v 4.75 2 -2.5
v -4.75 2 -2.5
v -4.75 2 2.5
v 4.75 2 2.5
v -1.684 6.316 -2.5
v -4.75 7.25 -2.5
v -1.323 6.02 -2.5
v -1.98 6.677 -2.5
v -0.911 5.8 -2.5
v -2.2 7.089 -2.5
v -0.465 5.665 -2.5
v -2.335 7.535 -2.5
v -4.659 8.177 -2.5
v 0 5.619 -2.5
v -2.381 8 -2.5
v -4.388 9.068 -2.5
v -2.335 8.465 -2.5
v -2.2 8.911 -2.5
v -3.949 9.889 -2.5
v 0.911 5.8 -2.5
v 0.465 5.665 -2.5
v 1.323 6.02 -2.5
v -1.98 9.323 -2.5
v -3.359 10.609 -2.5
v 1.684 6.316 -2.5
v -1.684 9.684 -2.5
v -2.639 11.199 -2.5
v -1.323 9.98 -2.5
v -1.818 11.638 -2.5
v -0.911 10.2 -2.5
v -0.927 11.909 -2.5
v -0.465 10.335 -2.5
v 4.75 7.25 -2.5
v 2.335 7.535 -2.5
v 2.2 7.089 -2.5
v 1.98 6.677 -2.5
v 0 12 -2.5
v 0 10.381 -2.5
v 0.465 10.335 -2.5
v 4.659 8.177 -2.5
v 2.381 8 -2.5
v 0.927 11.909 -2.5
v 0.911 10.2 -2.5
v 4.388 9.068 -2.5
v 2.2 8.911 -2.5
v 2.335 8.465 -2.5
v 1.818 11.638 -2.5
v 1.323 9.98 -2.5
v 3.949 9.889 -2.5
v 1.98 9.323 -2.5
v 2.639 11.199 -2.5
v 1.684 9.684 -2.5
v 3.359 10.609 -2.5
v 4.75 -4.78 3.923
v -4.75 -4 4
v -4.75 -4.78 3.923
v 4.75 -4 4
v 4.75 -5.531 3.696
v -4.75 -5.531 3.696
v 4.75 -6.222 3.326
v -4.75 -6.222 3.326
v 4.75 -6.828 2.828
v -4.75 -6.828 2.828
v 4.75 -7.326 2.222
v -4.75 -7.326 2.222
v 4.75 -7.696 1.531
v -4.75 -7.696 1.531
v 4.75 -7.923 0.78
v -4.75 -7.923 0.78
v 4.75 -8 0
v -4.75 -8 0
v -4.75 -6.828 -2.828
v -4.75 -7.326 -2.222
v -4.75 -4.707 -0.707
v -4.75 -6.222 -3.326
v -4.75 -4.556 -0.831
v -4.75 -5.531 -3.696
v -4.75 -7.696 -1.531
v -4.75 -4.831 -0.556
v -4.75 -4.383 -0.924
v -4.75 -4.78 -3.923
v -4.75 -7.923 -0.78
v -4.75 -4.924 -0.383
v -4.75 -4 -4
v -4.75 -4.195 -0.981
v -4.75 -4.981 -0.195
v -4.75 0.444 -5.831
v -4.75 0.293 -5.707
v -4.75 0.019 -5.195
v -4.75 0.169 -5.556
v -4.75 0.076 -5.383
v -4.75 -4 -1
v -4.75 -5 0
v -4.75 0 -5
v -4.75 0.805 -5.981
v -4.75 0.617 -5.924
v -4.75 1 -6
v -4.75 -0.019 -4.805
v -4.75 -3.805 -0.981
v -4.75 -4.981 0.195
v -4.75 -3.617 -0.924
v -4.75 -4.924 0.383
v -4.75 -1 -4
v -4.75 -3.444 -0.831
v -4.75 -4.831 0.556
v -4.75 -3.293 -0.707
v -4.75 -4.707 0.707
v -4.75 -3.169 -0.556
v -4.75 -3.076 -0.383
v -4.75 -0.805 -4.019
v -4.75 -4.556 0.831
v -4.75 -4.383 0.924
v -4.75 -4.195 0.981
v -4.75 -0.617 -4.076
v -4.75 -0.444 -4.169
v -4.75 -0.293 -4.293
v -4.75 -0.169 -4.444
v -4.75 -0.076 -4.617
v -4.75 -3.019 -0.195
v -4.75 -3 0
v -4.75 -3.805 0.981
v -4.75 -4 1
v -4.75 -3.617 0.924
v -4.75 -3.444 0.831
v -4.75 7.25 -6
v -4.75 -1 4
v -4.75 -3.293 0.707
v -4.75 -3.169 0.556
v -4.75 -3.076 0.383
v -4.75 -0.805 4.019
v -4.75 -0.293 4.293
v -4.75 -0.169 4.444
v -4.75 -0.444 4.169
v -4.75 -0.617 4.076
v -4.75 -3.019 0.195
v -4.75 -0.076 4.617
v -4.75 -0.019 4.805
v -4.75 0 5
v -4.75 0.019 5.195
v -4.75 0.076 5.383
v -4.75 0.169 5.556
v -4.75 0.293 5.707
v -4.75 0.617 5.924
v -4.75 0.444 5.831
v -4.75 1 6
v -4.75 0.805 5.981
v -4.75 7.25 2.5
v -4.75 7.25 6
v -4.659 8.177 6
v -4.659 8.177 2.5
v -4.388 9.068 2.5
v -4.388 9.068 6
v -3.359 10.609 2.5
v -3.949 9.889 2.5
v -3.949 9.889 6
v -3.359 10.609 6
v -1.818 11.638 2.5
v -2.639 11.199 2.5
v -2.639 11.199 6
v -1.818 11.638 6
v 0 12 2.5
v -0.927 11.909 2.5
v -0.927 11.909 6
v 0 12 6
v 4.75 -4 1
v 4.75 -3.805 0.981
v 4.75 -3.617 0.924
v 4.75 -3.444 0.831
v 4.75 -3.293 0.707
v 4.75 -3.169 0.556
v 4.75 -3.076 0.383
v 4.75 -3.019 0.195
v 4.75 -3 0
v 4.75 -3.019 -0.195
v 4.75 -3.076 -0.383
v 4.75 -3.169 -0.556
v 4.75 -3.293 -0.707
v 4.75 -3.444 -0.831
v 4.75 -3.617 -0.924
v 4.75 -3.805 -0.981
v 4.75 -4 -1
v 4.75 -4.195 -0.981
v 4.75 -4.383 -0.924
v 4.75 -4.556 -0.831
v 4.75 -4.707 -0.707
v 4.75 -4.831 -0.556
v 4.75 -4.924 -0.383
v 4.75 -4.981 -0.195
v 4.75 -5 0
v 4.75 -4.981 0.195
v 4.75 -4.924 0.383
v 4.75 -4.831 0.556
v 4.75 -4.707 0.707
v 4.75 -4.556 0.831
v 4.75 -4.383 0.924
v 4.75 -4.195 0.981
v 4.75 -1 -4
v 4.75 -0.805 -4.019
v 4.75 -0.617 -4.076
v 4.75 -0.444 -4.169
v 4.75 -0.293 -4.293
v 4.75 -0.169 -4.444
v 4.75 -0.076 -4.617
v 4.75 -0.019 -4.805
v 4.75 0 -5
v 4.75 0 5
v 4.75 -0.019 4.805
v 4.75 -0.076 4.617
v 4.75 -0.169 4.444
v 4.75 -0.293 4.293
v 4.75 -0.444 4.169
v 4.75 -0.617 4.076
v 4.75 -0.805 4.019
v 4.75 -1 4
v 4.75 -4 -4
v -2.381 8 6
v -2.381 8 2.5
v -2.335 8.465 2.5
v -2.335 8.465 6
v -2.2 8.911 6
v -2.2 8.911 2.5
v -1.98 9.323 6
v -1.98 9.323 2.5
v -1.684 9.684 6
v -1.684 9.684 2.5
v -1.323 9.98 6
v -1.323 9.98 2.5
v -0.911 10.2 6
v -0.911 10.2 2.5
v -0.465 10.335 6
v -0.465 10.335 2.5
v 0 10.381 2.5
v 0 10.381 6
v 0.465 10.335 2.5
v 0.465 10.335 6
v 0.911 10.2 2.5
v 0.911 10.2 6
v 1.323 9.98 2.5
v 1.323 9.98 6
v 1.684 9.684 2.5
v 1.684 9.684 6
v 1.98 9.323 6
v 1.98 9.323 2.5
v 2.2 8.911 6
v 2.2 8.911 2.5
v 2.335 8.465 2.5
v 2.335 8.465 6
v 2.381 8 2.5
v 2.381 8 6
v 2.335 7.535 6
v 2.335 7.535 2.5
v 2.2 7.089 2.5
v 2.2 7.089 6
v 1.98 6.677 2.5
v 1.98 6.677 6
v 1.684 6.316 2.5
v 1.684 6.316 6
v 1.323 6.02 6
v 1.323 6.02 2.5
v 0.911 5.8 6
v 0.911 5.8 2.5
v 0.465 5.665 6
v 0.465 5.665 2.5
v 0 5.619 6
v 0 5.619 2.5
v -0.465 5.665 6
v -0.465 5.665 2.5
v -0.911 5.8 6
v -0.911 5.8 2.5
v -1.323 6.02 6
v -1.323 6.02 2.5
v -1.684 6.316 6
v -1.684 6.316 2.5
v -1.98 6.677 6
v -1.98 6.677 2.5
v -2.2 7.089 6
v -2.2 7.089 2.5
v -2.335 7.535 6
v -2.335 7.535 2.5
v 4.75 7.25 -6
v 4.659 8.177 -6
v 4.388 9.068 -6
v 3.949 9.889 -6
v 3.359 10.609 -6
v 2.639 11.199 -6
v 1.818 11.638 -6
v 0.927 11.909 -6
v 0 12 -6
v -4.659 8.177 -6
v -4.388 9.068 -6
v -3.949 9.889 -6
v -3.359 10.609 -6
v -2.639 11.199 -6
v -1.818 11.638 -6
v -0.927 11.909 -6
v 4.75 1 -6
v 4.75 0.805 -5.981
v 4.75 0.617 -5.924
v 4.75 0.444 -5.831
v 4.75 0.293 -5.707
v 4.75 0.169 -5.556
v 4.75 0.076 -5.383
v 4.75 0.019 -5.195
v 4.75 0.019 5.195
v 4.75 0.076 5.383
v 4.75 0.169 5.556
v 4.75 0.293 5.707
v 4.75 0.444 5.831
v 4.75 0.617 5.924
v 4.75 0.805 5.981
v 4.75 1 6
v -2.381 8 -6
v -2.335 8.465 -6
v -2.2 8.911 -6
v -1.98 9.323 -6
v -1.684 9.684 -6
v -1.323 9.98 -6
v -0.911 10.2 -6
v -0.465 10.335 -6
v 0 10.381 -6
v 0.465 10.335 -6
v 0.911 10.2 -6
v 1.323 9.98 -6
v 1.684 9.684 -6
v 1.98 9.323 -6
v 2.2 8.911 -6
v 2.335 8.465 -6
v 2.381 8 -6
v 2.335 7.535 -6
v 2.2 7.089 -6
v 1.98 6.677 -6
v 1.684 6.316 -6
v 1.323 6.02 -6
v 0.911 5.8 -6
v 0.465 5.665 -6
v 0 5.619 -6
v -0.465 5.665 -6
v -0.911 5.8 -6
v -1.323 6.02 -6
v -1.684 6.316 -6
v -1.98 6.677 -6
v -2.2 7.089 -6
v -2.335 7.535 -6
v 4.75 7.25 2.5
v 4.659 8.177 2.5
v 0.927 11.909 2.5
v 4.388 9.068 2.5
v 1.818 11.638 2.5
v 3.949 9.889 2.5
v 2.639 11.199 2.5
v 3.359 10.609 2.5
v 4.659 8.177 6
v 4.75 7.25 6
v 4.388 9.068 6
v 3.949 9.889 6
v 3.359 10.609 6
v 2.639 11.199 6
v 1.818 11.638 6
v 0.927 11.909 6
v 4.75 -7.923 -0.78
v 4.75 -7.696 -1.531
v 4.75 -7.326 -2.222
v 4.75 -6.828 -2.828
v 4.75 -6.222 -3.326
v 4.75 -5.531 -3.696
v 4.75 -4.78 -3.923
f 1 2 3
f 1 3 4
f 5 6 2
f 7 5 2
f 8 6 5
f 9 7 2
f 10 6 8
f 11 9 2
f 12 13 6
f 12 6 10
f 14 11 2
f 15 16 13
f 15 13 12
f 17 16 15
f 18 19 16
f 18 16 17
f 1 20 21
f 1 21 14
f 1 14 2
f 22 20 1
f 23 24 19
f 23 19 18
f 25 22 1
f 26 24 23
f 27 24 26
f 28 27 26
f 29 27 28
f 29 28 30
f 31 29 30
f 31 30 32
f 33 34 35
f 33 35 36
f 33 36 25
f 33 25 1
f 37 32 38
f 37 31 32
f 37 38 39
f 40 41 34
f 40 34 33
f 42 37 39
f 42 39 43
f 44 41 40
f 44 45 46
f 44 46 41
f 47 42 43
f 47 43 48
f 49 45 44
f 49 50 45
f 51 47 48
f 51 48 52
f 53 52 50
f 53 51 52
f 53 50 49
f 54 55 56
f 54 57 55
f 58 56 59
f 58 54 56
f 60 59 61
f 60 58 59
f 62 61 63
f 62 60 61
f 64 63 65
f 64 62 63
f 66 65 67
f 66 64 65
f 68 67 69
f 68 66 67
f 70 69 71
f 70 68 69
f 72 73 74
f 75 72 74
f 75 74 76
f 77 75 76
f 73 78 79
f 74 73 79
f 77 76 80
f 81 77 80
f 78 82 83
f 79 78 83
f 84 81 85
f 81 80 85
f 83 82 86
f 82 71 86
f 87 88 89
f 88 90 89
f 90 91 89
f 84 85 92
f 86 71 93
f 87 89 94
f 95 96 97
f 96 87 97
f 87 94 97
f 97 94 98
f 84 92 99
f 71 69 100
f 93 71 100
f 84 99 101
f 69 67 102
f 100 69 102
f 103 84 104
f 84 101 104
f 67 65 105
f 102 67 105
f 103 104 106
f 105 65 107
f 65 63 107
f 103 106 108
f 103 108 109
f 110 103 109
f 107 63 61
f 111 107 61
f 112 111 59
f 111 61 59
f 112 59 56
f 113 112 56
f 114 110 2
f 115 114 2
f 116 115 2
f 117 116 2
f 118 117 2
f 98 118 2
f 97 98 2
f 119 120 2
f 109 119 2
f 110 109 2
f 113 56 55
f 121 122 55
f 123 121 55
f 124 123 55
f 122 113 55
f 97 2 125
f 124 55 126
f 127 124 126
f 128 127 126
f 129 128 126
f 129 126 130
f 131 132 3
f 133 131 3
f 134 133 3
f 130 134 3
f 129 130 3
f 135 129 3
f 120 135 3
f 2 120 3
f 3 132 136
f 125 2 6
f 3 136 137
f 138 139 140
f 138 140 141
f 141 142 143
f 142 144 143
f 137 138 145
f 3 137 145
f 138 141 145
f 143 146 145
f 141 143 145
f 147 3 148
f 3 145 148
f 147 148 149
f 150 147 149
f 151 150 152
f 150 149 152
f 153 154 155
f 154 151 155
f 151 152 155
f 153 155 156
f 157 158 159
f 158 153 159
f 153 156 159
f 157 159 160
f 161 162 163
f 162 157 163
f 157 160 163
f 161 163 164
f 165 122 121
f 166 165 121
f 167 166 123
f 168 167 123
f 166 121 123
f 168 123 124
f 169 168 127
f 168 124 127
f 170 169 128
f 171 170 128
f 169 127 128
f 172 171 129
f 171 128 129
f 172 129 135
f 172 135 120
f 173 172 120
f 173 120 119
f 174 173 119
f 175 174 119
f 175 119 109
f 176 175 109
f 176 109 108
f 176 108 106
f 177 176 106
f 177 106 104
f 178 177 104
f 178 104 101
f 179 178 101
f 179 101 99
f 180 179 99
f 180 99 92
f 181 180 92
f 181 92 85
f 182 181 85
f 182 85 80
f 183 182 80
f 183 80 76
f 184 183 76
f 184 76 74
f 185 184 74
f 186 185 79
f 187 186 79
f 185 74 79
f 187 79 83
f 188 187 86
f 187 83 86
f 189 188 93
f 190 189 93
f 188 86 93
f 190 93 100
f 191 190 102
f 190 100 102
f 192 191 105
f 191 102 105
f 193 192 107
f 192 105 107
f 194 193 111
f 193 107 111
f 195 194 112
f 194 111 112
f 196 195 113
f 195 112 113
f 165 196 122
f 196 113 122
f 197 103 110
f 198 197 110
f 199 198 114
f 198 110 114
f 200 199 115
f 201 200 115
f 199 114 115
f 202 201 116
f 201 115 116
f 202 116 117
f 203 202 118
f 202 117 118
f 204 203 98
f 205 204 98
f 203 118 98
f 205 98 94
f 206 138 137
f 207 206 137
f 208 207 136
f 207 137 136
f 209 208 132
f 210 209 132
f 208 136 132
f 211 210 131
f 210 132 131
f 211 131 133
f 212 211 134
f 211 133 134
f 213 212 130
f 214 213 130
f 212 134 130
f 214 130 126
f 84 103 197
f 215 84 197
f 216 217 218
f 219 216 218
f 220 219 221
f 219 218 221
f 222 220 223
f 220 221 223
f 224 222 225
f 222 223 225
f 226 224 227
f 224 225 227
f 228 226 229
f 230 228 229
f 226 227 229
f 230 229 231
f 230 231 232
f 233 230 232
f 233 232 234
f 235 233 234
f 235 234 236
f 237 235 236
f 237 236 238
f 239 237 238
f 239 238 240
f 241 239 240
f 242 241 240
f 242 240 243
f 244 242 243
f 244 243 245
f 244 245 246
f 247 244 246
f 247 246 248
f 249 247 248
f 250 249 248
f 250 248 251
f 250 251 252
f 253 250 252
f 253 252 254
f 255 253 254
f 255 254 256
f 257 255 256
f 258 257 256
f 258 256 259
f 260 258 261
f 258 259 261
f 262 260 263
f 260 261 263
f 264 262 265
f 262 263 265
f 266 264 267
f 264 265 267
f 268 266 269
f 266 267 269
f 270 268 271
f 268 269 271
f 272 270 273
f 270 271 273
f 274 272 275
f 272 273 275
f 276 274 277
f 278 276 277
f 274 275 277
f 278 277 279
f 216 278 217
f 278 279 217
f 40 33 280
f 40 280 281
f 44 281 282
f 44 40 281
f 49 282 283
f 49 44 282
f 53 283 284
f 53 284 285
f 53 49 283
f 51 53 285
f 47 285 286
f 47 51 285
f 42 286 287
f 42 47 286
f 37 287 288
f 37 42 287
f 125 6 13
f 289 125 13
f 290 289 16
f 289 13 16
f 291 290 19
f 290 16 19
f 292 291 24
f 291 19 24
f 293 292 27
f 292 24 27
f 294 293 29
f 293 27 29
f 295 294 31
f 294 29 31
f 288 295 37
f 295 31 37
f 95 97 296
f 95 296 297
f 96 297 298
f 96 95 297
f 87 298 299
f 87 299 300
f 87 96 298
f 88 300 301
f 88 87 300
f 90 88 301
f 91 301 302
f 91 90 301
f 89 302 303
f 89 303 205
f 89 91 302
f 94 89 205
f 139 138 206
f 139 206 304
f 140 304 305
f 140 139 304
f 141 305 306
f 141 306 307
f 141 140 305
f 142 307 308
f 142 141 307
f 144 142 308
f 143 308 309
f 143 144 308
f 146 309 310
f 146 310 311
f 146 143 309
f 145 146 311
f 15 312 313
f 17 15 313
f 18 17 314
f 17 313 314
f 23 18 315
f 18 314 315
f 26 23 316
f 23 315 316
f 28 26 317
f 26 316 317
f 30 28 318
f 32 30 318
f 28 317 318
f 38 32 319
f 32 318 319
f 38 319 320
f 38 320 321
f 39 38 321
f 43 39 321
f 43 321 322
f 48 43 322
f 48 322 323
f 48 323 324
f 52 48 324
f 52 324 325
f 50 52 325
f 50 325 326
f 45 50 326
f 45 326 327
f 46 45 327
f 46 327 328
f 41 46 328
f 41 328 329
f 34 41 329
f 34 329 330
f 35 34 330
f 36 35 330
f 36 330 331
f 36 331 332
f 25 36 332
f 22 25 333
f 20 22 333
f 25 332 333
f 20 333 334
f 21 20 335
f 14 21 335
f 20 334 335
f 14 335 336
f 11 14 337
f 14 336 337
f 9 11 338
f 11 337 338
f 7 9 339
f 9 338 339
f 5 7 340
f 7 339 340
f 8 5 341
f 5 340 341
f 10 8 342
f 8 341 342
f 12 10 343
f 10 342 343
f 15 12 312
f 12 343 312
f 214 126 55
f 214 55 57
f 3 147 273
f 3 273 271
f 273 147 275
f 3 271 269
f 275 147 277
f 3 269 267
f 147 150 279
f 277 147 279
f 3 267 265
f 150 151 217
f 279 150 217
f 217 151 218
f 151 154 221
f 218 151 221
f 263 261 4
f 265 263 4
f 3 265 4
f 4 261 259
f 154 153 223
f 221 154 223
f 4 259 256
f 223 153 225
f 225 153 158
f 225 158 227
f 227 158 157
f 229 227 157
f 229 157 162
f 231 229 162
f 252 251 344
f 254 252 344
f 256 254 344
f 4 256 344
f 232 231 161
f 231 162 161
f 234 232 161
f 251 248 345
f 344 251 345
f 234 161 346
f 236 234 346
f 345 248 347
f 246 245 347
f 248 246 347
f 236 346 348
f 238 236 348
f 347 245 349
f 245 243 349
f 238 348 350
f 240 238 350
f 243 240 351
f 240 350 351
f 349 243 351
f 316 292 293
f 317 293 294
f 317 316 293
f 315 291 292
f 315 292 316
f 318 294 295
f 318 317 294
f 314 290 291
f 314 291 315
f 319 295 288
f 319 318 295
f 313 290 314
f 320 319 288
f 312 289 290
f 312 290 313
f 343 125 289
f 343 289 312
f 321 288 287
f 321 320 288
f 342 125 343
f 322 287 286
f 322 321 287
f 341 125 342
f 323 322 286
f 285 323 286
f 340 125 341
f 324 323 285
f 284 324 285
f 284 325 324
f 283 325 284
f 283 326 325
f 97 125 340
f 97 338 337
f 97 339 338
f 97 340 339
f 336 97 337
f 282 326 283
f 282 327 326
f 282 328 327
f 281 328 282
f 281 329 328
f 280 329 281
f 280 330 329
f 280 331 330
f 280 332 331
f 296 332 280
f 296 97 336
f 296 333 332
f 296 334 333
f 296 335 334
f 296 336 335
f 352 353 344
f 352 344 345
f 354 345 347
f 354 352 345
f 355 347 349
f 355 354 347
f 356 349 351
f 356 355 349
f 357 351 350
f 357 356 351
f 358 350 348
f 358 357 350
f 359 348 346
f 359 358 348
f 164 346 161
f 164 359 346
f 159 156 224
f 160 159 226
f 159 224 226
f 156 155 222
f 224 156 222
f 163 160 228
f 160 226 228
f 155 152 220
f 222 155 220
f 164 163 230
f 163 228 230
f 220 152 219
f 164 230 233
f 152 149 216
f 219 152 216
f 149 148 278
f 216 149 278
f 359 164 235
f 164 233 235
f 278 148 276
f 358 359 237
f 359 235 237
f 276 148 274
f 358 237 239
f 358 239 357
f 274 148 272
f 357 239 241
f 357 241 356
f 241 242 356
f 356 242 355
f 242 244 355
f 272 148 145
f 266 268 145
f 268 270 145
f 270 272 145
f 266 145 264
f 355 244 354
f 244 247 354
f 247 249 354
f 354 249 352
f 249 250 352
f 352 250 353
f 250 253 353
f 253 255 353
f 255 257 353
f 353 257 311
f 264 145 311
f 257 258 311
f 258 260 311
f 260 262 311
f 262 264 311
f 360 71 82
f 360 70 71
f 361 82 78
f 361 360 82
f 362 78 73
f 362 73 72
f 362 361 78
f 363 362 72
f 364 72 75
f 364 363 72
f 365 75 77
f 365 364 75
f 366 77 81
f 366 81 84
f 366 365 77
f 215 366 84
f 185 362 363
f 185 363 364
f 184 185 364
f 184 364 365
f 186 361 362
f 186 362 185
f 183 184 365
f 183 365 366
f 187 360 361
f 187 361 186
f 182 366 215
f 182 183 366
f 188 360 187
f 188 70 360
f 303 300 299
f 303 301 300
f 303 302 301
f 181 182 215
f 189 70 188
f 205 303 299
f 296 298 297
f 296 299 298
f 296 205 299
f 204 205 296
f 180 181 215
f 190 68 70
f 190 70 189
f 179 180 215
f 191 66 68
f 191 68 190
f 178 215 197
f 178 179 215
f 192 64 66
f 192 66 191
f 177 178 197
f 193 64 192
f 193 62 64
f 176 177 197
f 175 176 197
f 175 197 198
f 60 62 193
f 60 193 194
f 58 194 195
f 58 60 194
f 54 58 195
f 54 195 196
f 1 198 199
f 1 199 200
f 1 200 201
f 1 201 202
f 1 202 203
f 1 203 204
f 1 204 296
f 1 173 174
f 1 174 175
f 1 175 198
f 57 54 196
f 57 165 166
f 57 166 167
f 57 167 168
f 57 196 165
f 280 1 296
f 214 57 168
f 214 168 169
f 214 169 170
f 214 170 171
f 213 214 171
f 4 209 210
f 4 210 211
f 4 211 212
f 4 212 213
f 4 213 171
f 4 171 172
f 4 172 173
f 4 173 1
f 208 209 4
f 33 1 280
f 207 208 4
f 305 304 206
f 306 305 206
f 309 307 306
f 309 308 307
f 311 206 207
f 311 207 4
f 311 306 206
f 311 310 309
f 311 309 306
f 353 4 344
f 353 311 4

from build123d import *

# Parameters (mm, degrees)
SKETCH1_W           = 9.5
SKETCH1_H           = 12
BOSS_EXTRUDE1_DEPTH = 12
SKETCH2_W           = 13
SKETCH2_H           = 5
CUT_EXTRUDE1_DEPTH  = 10
SKETCH3_R           = 2.38125
CUT_EXTRUDE2_DEPTH  = 18.622783549
CUT_EXTRUDE3_START  = -13
CUT_EXTRUDE3_DEPTH  = 31.622783549
SKETCH6_W           = 9.5
SKETCH6_H           = 8
BOSS_EXTRUDE3_DEPTH = 8
SKETCH7_R           = 1
CUT_EXTRUDE5_DEPTH  = 10
FILLET2_R           = 4
FILLET3_START       = -6
FILLET3_DEPTH       = 12
FILLET3_START_2     = -4.75
FILLET3_2_DEPTH     = 9.5


with BuildPart() as part:
    # Sketch1 → Boss-Extrude1 (new body)
    with BuildSketch(Plane(origin=(0, 0, 0), x_dir=(1, 0, 0), z_dir=(0, 1, 0))):
        Rectangle(SKETCH1_W, SKETCH1_H)
    extrude(amount=BOSS_EXTRUDE1_DEPTH)

    # Sketch2 → Cut-Extrude1 (cut)
    with BuildSketch(Plane(origin=(0, 12, 0), x_dir=(1, 0, 0), z_dir=(0, 1, 0))):
        Rectangle(SKETCH2_W, SKETCH2_H)
    extrude(amount=-CUT_EXTRUDE1_DEPTH, mode=Mode.SUBTRACT)

    # Sketch3 → Cut-Extrude2 (cut, through all)
    with BuildSketch(Plane(origin=(0, 0, -6), x_dir=(-1, 0, 0), z_dir=(0, 0, -1))):
        with Locations((0, 8)):
            Circle(SKETCH3_R)
    extrude(amount=-CUT_EXTRUDE2_DEPTH, mode=Mode.SUBTRACT)

    # Sketch4 → Cut-Extrude3 (cut)
    with BuildSketch(Plane(origin=(0, 0, -6), x_dir=(-1, 0, 0), z_dir=(0, 0, -1)).offset(CUT_EXTRUDE3_START)):
        with BuildLine():
            Line((-4.75, 12), (-4.75, 7.25))
            ThreePointArc((-4.75, 7.25), (-3.358757211, 10.608757211), (0, 12))
            Line((0, 12), (-4.75, 12))
        make_face()
    cut_extrude3 = extrude(amount=CUT_EXTRUDE3_DEPTH, mode=Mode.SUBTRACT)

    # Mirror1: Cut-Extrude3 across plane
    add(cut_extrude3.mirror(Plane(origin=(0, 0, 0), x_dir=(0, 0, 1), z_dir=(1, 0, 0))), mode=Mode.SUBTRACT)

    # Sketch6 → Boss-Extrude3 (add)
    with BuildSketch(Plane.XZ):
        Rectangle(SKETCH6_W, SKETCH6_H)
    extrude(amount=BOSS_EXTRUDE3_DEPTH)

    # Sketch7 → Cut-Extrude5 (cut)
    with BuildSketch(Plane.ZY.offset(4.75)):
        with Locations((0, -4)):
            Circle(SKETCH7_R)
    extrude(amount=-CUT_EXTRUDE5_DEPTH, mode=Mode.SUBTRACT)

    # Fillet2
    fillet2_edges = [part.edges().sort_by_distance(p)[0] for p in [
        (0, -8, 4),
        (0, -8, -4),
    ]]
    fillet(fillet2_edges, radius=FILLET2_R - 0.0001)  # a hair under: the kernel refuses the full size

    # Fillet3: read off the stored shape, not the designer's step
    # Fillet3 outline → Fillet3 (cut)
    with BuildSketch(Plane.YZ.offset(FILLET3_START)):
        with BuildLine():
            Line((0, 6), (0, 5))
            ThreePointArc((0, 5), (0.292893219, 5.707106781), (1, 6))
            Line((1, 6), (0, 6))
        make_face()
        with BuildLine():
            ThreePointArc((1, -6), (0.292893219, -5.707106781), (0, -5))
            Line((0, -5), (0, -6))
            Line((0, -6), (1, -6))
        make_face()
    extrude(amount=FILLET3_DEPTH, mode=Mode.SUBTRACT)

    # Fillet3 2 outline → Fillet3 2 (add)
    with BuildSketch(Plane.YZ.offset(FILLET3_START_2)):
        with BuildLine():
            Line((0, 4), (0, 5))
            ThreePointArc((0, 5), (-0.292893219, 4.292893219), (-1, 4))
            Line((-1, 4), (0, 4))
        make_face()
        with BuildLine():
            ThreePointArc((-1, -4), (-0.292893219, -4.292893219), (0, -5))
            Line((0, -5), (0, -4))
            Line((0, -4), (-1, -4))
        make_face()
    extrude(amount=FILLET3_2_DEPTH)


solid = part.part
